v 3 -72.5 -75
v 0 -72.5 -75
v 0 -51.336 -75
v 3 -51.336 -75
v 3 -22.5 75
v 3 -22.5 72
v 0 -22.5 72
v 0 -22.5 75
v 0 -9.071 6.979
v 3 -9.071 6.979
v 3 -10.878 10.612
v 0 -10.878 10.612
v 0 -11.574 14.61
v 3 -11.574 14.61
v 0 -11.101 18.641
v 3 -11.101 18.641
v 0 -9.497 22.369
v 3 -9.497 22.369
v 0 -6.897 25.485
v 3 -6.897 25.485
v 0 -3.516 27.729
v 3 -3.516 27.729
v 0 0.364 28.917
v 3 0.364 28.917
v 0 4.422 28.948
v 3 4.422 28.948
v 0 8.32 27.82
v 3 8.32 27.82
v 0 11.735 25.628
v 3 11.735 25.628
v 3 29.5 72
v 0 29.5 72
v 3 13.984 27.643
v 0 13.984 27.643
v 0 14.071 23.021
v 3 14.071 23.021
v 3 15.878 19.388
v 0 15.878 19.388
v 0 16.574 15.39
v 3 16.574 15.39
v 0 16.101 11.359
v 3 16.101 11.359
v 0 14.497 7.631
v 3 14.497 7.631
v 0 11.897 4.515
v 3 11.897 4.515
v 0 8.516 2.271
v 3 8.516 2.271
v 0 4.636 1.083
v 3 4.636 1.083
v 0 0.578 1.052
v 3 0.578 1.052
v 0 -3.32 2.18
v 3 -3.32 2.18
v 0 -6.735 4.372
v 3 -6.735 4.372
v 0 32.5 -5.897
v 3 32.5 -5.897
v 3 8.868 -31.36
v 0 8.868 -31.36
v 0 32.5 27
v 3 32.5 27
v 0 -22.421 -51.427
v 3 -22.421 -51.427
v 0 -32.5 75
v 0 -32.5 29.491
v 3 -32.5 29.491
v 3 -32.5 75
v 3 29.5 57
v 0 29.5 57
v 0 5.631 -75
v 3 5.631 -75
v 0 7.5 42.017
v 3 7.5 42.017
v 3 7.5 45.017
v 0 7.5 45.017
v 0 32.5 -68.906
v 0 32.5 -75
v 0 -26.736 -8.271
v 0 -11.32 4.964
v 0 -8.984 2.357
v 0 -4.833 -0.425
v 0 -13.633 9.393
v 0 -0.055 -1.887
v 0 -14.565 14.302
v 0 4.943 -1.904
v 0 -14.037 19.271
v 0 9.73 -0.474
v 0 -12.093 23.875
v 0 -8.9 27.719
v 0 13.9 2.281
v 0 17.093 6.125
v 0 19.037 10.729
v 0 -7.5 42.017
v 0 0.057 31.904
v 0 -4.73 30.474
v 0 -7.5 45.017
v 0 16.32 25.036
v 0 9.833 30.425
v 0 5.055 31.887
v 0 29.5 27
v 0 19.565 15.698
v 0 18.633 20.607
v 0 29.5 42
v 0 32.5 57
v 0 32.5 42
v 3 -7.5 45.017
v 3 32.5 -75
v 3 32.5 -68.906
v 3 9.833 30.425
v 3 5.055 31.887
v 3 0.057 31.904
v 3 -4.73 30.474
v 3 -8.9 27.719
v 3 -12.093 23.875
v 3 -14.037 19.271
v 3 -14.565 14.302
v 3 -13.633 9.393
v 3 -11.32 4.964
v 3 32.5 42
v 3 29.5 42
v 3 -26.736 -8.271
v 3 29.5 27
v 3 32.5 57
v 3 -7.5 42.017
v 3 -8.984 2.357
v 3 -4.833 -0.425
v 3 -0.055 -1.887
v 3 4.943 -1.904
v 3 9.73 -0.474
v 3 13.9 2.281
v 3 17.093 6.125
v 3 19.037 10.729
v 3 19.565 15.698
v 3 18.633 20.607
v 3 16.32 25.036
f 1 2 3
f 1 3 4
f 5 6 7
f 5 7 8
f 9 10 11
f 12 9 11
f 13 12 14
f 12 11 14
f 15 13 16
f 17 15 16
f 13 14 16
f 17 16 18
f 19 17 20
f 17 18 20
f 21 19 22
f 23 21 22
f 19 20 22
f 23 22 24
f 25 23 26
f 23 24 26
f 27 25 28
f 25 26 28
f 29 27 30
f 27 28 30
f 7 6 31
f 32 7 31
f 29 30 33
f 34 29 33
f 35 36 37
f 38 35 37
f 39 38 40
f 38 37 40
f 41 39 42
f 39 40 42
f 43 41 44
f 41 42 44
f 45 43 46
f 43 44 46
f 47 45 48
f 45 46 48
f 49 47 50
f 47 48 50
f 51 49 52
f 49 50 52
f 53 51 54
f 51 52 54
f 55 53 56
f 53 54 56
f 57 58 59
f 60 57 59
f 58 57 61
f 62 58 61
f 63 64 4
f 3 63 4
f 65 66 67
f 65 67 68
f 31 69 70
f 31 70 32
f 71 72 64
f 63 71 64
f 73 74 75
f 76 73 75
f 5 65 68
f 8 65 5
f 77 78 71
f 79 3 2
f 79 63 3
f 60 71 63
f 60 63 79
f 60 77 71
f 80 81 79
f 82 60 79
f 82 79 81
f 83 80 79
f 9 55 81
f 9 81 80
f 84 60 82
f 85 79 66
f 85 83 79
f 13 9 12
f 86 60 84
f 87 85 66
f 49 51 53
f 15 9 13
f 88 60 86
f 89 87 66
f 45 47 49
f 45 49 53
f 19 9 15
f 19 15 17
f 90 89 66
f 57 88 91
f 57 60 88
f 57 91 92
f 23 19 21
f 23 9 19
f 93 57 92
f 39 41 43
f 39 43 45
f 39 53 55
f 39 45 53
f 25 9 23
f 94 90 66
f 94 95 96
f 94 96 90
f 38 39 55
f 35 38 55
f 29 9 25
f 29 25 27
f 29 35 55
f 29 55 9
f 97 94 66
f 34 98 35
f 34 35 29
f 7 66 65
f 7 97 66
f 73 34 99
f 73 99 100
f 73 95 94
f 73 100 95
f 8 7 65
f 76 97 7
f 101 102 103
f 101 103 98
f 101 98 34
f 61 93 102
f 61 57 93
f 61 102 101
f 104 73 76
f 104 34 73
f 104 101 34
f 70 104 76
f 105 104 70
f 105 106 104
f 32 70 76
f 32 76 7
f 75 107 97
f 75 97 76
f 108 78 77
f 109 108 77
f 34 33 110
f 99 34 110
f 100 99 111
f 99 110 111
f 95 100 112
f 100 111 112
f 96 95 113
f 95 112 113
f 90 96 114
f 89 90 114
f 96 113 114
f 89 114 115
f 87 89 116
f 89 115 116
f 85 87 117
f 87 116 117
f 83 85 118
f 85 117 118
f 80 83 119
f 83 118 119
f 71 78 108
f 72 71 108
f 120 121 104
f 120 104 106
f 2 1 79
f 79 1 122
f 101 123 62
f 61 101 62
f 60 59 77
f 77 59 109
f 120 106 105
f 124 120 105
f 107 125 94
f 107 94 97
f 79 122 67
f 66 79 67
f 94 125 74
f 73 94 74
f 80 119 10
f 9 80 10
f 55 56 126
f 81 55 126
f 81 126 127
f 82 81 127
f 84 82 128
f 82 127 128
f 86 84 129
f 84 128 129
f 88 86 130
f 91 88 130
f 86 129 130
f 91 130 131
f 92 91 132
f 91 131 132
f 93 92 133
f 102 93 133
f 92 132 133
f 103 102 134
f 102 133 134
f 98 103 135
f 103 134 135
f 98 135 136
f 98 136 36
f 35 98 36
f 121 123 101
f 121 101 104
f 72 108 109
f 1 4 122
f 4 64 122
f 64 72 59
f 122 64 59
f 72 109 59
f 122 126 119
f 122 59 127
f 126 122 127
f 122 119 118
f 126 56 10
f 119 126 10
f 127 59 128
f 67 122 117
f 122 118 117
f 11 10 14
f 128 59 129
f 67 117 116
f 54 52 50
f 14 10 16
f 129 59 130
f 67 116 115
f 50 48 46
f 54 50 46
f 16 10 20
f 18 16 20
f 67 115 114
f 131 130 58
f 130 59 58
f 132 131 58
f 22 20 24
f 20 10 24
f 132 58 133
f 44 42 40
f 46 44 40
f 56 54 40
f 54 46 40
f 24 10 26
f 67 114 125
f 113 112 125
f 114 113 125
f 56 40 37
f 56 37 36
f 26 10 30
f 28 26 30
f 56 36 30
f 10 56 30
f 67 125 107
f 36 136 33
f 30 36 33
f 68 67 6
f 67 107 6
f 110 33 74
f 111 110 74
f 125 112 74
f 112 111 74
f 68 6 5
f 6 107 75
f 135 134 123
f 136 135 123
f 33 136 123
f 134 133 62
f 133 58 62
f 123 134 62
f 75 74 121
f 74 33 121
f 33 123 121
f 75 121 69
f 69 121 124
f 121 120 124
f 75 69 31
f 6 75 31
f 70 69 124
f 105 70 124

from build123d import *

# Parameters (mm, degrees)
F0_W     = 65
F0_H     = 150
F1_DEPTH = 3
F2_W     = 55
F2_H     = 3
F3_DEPTH = 3
F4_W     = 3
F4_H     = 15
F5_DEPTH = 3
F6_W     = 3
F6_H     = 75
F7_DEPTH = 40
F8_W     = 15
F8_H     = 3
F9_DEPTH = 3


with BuildPart() as f1:
    # F0 (on Right) → F1 (new body)
    with BuildSketch(Plane.YZ):
        Rectangle(F0_W, F0_H)
    extrude(amount=F1_DEPTH)

    # F2 (on face) → F3 (cut, through all)
    with BuildSketch(Plane.YZ.offset(3)):
        with Locations((5, 73.5)):
            Rectangle(F2_W, F2_H)
    extrude(amount=-F3_DEPTH, mode=Mode.SUBTRACT)

    # F4 (on face) → F5 (cut, through all)
    with BuildSketch(Plane.YZ.offset(3)):
        with Locations((31, 64.5)):
            Rectangle(F4_W, F4_H)
        with Locations((31, 34.5)):
            Rectangle(F4_W, F4_H)
    extrude(amount=-F5_DEPTH, mode=Mode.SUBTRACT)

    # F6 (on face) → F7 (join)
    with BuildSketch(Plane.XZ.offset(32.5)):
        with Locations((1.5, -37.5)):
            Rectangle(F6_W, F6_H)
    extrude(amount=F7_DEPTH)

    # F8 (on face) → F9 (cut, through all)
    with BuildSketch(Plane.YZ.offset(3)):
        with BuildLine():
            Line((-6.735242, 4.372493), (-8.983605, 2.357307))
            ThreePointArc((-8.983605, 2.357307), (13.899524, 2.281442), (16.319635, 25.036362))
            Line((16.319635, 25.036362), (14.071272, 23.021176))
            ThreePointArc((14.071272, 23.021176), (11.897213, 4.51544), (-6.735242, 4.372493))
        make_face()
        with BuildLine():
            ThreePointArc((13.983605, 27.642693), (-8.899524, 27.718558), (-11.319635, 4.963638))
            Line((-11.319635, 4.963638), (-9.071272, 6.978824))
            ThreePointArc((-9.071272, 6.978824), (-6.897213, 25.48456), (11.735242, 25.627507))
            Line((11.735242, 25.627507), (13.983605, 27.642693))
        make_face()
        Polygon((-26.736403, -8.270669), (-32.5, 29.491454), (-32.5, 0), (-72.5, 0), (-72.5, -75), align=None)
        Polygon((-22.420732, -51.427379), (-51.33573, -75), (5.631127, -75), align=None)
        Polygon((8.86788, -31.359509), (32.5, -68.905853), (32.5, -5.897049), align=None)
        with Locations((0, 43.517388)):
            Rectangle(F8_W, F8_H)
    extrude(amount=-F9_DEPTH, mode=Mode.SUBTRACT)


solid = f1.part
